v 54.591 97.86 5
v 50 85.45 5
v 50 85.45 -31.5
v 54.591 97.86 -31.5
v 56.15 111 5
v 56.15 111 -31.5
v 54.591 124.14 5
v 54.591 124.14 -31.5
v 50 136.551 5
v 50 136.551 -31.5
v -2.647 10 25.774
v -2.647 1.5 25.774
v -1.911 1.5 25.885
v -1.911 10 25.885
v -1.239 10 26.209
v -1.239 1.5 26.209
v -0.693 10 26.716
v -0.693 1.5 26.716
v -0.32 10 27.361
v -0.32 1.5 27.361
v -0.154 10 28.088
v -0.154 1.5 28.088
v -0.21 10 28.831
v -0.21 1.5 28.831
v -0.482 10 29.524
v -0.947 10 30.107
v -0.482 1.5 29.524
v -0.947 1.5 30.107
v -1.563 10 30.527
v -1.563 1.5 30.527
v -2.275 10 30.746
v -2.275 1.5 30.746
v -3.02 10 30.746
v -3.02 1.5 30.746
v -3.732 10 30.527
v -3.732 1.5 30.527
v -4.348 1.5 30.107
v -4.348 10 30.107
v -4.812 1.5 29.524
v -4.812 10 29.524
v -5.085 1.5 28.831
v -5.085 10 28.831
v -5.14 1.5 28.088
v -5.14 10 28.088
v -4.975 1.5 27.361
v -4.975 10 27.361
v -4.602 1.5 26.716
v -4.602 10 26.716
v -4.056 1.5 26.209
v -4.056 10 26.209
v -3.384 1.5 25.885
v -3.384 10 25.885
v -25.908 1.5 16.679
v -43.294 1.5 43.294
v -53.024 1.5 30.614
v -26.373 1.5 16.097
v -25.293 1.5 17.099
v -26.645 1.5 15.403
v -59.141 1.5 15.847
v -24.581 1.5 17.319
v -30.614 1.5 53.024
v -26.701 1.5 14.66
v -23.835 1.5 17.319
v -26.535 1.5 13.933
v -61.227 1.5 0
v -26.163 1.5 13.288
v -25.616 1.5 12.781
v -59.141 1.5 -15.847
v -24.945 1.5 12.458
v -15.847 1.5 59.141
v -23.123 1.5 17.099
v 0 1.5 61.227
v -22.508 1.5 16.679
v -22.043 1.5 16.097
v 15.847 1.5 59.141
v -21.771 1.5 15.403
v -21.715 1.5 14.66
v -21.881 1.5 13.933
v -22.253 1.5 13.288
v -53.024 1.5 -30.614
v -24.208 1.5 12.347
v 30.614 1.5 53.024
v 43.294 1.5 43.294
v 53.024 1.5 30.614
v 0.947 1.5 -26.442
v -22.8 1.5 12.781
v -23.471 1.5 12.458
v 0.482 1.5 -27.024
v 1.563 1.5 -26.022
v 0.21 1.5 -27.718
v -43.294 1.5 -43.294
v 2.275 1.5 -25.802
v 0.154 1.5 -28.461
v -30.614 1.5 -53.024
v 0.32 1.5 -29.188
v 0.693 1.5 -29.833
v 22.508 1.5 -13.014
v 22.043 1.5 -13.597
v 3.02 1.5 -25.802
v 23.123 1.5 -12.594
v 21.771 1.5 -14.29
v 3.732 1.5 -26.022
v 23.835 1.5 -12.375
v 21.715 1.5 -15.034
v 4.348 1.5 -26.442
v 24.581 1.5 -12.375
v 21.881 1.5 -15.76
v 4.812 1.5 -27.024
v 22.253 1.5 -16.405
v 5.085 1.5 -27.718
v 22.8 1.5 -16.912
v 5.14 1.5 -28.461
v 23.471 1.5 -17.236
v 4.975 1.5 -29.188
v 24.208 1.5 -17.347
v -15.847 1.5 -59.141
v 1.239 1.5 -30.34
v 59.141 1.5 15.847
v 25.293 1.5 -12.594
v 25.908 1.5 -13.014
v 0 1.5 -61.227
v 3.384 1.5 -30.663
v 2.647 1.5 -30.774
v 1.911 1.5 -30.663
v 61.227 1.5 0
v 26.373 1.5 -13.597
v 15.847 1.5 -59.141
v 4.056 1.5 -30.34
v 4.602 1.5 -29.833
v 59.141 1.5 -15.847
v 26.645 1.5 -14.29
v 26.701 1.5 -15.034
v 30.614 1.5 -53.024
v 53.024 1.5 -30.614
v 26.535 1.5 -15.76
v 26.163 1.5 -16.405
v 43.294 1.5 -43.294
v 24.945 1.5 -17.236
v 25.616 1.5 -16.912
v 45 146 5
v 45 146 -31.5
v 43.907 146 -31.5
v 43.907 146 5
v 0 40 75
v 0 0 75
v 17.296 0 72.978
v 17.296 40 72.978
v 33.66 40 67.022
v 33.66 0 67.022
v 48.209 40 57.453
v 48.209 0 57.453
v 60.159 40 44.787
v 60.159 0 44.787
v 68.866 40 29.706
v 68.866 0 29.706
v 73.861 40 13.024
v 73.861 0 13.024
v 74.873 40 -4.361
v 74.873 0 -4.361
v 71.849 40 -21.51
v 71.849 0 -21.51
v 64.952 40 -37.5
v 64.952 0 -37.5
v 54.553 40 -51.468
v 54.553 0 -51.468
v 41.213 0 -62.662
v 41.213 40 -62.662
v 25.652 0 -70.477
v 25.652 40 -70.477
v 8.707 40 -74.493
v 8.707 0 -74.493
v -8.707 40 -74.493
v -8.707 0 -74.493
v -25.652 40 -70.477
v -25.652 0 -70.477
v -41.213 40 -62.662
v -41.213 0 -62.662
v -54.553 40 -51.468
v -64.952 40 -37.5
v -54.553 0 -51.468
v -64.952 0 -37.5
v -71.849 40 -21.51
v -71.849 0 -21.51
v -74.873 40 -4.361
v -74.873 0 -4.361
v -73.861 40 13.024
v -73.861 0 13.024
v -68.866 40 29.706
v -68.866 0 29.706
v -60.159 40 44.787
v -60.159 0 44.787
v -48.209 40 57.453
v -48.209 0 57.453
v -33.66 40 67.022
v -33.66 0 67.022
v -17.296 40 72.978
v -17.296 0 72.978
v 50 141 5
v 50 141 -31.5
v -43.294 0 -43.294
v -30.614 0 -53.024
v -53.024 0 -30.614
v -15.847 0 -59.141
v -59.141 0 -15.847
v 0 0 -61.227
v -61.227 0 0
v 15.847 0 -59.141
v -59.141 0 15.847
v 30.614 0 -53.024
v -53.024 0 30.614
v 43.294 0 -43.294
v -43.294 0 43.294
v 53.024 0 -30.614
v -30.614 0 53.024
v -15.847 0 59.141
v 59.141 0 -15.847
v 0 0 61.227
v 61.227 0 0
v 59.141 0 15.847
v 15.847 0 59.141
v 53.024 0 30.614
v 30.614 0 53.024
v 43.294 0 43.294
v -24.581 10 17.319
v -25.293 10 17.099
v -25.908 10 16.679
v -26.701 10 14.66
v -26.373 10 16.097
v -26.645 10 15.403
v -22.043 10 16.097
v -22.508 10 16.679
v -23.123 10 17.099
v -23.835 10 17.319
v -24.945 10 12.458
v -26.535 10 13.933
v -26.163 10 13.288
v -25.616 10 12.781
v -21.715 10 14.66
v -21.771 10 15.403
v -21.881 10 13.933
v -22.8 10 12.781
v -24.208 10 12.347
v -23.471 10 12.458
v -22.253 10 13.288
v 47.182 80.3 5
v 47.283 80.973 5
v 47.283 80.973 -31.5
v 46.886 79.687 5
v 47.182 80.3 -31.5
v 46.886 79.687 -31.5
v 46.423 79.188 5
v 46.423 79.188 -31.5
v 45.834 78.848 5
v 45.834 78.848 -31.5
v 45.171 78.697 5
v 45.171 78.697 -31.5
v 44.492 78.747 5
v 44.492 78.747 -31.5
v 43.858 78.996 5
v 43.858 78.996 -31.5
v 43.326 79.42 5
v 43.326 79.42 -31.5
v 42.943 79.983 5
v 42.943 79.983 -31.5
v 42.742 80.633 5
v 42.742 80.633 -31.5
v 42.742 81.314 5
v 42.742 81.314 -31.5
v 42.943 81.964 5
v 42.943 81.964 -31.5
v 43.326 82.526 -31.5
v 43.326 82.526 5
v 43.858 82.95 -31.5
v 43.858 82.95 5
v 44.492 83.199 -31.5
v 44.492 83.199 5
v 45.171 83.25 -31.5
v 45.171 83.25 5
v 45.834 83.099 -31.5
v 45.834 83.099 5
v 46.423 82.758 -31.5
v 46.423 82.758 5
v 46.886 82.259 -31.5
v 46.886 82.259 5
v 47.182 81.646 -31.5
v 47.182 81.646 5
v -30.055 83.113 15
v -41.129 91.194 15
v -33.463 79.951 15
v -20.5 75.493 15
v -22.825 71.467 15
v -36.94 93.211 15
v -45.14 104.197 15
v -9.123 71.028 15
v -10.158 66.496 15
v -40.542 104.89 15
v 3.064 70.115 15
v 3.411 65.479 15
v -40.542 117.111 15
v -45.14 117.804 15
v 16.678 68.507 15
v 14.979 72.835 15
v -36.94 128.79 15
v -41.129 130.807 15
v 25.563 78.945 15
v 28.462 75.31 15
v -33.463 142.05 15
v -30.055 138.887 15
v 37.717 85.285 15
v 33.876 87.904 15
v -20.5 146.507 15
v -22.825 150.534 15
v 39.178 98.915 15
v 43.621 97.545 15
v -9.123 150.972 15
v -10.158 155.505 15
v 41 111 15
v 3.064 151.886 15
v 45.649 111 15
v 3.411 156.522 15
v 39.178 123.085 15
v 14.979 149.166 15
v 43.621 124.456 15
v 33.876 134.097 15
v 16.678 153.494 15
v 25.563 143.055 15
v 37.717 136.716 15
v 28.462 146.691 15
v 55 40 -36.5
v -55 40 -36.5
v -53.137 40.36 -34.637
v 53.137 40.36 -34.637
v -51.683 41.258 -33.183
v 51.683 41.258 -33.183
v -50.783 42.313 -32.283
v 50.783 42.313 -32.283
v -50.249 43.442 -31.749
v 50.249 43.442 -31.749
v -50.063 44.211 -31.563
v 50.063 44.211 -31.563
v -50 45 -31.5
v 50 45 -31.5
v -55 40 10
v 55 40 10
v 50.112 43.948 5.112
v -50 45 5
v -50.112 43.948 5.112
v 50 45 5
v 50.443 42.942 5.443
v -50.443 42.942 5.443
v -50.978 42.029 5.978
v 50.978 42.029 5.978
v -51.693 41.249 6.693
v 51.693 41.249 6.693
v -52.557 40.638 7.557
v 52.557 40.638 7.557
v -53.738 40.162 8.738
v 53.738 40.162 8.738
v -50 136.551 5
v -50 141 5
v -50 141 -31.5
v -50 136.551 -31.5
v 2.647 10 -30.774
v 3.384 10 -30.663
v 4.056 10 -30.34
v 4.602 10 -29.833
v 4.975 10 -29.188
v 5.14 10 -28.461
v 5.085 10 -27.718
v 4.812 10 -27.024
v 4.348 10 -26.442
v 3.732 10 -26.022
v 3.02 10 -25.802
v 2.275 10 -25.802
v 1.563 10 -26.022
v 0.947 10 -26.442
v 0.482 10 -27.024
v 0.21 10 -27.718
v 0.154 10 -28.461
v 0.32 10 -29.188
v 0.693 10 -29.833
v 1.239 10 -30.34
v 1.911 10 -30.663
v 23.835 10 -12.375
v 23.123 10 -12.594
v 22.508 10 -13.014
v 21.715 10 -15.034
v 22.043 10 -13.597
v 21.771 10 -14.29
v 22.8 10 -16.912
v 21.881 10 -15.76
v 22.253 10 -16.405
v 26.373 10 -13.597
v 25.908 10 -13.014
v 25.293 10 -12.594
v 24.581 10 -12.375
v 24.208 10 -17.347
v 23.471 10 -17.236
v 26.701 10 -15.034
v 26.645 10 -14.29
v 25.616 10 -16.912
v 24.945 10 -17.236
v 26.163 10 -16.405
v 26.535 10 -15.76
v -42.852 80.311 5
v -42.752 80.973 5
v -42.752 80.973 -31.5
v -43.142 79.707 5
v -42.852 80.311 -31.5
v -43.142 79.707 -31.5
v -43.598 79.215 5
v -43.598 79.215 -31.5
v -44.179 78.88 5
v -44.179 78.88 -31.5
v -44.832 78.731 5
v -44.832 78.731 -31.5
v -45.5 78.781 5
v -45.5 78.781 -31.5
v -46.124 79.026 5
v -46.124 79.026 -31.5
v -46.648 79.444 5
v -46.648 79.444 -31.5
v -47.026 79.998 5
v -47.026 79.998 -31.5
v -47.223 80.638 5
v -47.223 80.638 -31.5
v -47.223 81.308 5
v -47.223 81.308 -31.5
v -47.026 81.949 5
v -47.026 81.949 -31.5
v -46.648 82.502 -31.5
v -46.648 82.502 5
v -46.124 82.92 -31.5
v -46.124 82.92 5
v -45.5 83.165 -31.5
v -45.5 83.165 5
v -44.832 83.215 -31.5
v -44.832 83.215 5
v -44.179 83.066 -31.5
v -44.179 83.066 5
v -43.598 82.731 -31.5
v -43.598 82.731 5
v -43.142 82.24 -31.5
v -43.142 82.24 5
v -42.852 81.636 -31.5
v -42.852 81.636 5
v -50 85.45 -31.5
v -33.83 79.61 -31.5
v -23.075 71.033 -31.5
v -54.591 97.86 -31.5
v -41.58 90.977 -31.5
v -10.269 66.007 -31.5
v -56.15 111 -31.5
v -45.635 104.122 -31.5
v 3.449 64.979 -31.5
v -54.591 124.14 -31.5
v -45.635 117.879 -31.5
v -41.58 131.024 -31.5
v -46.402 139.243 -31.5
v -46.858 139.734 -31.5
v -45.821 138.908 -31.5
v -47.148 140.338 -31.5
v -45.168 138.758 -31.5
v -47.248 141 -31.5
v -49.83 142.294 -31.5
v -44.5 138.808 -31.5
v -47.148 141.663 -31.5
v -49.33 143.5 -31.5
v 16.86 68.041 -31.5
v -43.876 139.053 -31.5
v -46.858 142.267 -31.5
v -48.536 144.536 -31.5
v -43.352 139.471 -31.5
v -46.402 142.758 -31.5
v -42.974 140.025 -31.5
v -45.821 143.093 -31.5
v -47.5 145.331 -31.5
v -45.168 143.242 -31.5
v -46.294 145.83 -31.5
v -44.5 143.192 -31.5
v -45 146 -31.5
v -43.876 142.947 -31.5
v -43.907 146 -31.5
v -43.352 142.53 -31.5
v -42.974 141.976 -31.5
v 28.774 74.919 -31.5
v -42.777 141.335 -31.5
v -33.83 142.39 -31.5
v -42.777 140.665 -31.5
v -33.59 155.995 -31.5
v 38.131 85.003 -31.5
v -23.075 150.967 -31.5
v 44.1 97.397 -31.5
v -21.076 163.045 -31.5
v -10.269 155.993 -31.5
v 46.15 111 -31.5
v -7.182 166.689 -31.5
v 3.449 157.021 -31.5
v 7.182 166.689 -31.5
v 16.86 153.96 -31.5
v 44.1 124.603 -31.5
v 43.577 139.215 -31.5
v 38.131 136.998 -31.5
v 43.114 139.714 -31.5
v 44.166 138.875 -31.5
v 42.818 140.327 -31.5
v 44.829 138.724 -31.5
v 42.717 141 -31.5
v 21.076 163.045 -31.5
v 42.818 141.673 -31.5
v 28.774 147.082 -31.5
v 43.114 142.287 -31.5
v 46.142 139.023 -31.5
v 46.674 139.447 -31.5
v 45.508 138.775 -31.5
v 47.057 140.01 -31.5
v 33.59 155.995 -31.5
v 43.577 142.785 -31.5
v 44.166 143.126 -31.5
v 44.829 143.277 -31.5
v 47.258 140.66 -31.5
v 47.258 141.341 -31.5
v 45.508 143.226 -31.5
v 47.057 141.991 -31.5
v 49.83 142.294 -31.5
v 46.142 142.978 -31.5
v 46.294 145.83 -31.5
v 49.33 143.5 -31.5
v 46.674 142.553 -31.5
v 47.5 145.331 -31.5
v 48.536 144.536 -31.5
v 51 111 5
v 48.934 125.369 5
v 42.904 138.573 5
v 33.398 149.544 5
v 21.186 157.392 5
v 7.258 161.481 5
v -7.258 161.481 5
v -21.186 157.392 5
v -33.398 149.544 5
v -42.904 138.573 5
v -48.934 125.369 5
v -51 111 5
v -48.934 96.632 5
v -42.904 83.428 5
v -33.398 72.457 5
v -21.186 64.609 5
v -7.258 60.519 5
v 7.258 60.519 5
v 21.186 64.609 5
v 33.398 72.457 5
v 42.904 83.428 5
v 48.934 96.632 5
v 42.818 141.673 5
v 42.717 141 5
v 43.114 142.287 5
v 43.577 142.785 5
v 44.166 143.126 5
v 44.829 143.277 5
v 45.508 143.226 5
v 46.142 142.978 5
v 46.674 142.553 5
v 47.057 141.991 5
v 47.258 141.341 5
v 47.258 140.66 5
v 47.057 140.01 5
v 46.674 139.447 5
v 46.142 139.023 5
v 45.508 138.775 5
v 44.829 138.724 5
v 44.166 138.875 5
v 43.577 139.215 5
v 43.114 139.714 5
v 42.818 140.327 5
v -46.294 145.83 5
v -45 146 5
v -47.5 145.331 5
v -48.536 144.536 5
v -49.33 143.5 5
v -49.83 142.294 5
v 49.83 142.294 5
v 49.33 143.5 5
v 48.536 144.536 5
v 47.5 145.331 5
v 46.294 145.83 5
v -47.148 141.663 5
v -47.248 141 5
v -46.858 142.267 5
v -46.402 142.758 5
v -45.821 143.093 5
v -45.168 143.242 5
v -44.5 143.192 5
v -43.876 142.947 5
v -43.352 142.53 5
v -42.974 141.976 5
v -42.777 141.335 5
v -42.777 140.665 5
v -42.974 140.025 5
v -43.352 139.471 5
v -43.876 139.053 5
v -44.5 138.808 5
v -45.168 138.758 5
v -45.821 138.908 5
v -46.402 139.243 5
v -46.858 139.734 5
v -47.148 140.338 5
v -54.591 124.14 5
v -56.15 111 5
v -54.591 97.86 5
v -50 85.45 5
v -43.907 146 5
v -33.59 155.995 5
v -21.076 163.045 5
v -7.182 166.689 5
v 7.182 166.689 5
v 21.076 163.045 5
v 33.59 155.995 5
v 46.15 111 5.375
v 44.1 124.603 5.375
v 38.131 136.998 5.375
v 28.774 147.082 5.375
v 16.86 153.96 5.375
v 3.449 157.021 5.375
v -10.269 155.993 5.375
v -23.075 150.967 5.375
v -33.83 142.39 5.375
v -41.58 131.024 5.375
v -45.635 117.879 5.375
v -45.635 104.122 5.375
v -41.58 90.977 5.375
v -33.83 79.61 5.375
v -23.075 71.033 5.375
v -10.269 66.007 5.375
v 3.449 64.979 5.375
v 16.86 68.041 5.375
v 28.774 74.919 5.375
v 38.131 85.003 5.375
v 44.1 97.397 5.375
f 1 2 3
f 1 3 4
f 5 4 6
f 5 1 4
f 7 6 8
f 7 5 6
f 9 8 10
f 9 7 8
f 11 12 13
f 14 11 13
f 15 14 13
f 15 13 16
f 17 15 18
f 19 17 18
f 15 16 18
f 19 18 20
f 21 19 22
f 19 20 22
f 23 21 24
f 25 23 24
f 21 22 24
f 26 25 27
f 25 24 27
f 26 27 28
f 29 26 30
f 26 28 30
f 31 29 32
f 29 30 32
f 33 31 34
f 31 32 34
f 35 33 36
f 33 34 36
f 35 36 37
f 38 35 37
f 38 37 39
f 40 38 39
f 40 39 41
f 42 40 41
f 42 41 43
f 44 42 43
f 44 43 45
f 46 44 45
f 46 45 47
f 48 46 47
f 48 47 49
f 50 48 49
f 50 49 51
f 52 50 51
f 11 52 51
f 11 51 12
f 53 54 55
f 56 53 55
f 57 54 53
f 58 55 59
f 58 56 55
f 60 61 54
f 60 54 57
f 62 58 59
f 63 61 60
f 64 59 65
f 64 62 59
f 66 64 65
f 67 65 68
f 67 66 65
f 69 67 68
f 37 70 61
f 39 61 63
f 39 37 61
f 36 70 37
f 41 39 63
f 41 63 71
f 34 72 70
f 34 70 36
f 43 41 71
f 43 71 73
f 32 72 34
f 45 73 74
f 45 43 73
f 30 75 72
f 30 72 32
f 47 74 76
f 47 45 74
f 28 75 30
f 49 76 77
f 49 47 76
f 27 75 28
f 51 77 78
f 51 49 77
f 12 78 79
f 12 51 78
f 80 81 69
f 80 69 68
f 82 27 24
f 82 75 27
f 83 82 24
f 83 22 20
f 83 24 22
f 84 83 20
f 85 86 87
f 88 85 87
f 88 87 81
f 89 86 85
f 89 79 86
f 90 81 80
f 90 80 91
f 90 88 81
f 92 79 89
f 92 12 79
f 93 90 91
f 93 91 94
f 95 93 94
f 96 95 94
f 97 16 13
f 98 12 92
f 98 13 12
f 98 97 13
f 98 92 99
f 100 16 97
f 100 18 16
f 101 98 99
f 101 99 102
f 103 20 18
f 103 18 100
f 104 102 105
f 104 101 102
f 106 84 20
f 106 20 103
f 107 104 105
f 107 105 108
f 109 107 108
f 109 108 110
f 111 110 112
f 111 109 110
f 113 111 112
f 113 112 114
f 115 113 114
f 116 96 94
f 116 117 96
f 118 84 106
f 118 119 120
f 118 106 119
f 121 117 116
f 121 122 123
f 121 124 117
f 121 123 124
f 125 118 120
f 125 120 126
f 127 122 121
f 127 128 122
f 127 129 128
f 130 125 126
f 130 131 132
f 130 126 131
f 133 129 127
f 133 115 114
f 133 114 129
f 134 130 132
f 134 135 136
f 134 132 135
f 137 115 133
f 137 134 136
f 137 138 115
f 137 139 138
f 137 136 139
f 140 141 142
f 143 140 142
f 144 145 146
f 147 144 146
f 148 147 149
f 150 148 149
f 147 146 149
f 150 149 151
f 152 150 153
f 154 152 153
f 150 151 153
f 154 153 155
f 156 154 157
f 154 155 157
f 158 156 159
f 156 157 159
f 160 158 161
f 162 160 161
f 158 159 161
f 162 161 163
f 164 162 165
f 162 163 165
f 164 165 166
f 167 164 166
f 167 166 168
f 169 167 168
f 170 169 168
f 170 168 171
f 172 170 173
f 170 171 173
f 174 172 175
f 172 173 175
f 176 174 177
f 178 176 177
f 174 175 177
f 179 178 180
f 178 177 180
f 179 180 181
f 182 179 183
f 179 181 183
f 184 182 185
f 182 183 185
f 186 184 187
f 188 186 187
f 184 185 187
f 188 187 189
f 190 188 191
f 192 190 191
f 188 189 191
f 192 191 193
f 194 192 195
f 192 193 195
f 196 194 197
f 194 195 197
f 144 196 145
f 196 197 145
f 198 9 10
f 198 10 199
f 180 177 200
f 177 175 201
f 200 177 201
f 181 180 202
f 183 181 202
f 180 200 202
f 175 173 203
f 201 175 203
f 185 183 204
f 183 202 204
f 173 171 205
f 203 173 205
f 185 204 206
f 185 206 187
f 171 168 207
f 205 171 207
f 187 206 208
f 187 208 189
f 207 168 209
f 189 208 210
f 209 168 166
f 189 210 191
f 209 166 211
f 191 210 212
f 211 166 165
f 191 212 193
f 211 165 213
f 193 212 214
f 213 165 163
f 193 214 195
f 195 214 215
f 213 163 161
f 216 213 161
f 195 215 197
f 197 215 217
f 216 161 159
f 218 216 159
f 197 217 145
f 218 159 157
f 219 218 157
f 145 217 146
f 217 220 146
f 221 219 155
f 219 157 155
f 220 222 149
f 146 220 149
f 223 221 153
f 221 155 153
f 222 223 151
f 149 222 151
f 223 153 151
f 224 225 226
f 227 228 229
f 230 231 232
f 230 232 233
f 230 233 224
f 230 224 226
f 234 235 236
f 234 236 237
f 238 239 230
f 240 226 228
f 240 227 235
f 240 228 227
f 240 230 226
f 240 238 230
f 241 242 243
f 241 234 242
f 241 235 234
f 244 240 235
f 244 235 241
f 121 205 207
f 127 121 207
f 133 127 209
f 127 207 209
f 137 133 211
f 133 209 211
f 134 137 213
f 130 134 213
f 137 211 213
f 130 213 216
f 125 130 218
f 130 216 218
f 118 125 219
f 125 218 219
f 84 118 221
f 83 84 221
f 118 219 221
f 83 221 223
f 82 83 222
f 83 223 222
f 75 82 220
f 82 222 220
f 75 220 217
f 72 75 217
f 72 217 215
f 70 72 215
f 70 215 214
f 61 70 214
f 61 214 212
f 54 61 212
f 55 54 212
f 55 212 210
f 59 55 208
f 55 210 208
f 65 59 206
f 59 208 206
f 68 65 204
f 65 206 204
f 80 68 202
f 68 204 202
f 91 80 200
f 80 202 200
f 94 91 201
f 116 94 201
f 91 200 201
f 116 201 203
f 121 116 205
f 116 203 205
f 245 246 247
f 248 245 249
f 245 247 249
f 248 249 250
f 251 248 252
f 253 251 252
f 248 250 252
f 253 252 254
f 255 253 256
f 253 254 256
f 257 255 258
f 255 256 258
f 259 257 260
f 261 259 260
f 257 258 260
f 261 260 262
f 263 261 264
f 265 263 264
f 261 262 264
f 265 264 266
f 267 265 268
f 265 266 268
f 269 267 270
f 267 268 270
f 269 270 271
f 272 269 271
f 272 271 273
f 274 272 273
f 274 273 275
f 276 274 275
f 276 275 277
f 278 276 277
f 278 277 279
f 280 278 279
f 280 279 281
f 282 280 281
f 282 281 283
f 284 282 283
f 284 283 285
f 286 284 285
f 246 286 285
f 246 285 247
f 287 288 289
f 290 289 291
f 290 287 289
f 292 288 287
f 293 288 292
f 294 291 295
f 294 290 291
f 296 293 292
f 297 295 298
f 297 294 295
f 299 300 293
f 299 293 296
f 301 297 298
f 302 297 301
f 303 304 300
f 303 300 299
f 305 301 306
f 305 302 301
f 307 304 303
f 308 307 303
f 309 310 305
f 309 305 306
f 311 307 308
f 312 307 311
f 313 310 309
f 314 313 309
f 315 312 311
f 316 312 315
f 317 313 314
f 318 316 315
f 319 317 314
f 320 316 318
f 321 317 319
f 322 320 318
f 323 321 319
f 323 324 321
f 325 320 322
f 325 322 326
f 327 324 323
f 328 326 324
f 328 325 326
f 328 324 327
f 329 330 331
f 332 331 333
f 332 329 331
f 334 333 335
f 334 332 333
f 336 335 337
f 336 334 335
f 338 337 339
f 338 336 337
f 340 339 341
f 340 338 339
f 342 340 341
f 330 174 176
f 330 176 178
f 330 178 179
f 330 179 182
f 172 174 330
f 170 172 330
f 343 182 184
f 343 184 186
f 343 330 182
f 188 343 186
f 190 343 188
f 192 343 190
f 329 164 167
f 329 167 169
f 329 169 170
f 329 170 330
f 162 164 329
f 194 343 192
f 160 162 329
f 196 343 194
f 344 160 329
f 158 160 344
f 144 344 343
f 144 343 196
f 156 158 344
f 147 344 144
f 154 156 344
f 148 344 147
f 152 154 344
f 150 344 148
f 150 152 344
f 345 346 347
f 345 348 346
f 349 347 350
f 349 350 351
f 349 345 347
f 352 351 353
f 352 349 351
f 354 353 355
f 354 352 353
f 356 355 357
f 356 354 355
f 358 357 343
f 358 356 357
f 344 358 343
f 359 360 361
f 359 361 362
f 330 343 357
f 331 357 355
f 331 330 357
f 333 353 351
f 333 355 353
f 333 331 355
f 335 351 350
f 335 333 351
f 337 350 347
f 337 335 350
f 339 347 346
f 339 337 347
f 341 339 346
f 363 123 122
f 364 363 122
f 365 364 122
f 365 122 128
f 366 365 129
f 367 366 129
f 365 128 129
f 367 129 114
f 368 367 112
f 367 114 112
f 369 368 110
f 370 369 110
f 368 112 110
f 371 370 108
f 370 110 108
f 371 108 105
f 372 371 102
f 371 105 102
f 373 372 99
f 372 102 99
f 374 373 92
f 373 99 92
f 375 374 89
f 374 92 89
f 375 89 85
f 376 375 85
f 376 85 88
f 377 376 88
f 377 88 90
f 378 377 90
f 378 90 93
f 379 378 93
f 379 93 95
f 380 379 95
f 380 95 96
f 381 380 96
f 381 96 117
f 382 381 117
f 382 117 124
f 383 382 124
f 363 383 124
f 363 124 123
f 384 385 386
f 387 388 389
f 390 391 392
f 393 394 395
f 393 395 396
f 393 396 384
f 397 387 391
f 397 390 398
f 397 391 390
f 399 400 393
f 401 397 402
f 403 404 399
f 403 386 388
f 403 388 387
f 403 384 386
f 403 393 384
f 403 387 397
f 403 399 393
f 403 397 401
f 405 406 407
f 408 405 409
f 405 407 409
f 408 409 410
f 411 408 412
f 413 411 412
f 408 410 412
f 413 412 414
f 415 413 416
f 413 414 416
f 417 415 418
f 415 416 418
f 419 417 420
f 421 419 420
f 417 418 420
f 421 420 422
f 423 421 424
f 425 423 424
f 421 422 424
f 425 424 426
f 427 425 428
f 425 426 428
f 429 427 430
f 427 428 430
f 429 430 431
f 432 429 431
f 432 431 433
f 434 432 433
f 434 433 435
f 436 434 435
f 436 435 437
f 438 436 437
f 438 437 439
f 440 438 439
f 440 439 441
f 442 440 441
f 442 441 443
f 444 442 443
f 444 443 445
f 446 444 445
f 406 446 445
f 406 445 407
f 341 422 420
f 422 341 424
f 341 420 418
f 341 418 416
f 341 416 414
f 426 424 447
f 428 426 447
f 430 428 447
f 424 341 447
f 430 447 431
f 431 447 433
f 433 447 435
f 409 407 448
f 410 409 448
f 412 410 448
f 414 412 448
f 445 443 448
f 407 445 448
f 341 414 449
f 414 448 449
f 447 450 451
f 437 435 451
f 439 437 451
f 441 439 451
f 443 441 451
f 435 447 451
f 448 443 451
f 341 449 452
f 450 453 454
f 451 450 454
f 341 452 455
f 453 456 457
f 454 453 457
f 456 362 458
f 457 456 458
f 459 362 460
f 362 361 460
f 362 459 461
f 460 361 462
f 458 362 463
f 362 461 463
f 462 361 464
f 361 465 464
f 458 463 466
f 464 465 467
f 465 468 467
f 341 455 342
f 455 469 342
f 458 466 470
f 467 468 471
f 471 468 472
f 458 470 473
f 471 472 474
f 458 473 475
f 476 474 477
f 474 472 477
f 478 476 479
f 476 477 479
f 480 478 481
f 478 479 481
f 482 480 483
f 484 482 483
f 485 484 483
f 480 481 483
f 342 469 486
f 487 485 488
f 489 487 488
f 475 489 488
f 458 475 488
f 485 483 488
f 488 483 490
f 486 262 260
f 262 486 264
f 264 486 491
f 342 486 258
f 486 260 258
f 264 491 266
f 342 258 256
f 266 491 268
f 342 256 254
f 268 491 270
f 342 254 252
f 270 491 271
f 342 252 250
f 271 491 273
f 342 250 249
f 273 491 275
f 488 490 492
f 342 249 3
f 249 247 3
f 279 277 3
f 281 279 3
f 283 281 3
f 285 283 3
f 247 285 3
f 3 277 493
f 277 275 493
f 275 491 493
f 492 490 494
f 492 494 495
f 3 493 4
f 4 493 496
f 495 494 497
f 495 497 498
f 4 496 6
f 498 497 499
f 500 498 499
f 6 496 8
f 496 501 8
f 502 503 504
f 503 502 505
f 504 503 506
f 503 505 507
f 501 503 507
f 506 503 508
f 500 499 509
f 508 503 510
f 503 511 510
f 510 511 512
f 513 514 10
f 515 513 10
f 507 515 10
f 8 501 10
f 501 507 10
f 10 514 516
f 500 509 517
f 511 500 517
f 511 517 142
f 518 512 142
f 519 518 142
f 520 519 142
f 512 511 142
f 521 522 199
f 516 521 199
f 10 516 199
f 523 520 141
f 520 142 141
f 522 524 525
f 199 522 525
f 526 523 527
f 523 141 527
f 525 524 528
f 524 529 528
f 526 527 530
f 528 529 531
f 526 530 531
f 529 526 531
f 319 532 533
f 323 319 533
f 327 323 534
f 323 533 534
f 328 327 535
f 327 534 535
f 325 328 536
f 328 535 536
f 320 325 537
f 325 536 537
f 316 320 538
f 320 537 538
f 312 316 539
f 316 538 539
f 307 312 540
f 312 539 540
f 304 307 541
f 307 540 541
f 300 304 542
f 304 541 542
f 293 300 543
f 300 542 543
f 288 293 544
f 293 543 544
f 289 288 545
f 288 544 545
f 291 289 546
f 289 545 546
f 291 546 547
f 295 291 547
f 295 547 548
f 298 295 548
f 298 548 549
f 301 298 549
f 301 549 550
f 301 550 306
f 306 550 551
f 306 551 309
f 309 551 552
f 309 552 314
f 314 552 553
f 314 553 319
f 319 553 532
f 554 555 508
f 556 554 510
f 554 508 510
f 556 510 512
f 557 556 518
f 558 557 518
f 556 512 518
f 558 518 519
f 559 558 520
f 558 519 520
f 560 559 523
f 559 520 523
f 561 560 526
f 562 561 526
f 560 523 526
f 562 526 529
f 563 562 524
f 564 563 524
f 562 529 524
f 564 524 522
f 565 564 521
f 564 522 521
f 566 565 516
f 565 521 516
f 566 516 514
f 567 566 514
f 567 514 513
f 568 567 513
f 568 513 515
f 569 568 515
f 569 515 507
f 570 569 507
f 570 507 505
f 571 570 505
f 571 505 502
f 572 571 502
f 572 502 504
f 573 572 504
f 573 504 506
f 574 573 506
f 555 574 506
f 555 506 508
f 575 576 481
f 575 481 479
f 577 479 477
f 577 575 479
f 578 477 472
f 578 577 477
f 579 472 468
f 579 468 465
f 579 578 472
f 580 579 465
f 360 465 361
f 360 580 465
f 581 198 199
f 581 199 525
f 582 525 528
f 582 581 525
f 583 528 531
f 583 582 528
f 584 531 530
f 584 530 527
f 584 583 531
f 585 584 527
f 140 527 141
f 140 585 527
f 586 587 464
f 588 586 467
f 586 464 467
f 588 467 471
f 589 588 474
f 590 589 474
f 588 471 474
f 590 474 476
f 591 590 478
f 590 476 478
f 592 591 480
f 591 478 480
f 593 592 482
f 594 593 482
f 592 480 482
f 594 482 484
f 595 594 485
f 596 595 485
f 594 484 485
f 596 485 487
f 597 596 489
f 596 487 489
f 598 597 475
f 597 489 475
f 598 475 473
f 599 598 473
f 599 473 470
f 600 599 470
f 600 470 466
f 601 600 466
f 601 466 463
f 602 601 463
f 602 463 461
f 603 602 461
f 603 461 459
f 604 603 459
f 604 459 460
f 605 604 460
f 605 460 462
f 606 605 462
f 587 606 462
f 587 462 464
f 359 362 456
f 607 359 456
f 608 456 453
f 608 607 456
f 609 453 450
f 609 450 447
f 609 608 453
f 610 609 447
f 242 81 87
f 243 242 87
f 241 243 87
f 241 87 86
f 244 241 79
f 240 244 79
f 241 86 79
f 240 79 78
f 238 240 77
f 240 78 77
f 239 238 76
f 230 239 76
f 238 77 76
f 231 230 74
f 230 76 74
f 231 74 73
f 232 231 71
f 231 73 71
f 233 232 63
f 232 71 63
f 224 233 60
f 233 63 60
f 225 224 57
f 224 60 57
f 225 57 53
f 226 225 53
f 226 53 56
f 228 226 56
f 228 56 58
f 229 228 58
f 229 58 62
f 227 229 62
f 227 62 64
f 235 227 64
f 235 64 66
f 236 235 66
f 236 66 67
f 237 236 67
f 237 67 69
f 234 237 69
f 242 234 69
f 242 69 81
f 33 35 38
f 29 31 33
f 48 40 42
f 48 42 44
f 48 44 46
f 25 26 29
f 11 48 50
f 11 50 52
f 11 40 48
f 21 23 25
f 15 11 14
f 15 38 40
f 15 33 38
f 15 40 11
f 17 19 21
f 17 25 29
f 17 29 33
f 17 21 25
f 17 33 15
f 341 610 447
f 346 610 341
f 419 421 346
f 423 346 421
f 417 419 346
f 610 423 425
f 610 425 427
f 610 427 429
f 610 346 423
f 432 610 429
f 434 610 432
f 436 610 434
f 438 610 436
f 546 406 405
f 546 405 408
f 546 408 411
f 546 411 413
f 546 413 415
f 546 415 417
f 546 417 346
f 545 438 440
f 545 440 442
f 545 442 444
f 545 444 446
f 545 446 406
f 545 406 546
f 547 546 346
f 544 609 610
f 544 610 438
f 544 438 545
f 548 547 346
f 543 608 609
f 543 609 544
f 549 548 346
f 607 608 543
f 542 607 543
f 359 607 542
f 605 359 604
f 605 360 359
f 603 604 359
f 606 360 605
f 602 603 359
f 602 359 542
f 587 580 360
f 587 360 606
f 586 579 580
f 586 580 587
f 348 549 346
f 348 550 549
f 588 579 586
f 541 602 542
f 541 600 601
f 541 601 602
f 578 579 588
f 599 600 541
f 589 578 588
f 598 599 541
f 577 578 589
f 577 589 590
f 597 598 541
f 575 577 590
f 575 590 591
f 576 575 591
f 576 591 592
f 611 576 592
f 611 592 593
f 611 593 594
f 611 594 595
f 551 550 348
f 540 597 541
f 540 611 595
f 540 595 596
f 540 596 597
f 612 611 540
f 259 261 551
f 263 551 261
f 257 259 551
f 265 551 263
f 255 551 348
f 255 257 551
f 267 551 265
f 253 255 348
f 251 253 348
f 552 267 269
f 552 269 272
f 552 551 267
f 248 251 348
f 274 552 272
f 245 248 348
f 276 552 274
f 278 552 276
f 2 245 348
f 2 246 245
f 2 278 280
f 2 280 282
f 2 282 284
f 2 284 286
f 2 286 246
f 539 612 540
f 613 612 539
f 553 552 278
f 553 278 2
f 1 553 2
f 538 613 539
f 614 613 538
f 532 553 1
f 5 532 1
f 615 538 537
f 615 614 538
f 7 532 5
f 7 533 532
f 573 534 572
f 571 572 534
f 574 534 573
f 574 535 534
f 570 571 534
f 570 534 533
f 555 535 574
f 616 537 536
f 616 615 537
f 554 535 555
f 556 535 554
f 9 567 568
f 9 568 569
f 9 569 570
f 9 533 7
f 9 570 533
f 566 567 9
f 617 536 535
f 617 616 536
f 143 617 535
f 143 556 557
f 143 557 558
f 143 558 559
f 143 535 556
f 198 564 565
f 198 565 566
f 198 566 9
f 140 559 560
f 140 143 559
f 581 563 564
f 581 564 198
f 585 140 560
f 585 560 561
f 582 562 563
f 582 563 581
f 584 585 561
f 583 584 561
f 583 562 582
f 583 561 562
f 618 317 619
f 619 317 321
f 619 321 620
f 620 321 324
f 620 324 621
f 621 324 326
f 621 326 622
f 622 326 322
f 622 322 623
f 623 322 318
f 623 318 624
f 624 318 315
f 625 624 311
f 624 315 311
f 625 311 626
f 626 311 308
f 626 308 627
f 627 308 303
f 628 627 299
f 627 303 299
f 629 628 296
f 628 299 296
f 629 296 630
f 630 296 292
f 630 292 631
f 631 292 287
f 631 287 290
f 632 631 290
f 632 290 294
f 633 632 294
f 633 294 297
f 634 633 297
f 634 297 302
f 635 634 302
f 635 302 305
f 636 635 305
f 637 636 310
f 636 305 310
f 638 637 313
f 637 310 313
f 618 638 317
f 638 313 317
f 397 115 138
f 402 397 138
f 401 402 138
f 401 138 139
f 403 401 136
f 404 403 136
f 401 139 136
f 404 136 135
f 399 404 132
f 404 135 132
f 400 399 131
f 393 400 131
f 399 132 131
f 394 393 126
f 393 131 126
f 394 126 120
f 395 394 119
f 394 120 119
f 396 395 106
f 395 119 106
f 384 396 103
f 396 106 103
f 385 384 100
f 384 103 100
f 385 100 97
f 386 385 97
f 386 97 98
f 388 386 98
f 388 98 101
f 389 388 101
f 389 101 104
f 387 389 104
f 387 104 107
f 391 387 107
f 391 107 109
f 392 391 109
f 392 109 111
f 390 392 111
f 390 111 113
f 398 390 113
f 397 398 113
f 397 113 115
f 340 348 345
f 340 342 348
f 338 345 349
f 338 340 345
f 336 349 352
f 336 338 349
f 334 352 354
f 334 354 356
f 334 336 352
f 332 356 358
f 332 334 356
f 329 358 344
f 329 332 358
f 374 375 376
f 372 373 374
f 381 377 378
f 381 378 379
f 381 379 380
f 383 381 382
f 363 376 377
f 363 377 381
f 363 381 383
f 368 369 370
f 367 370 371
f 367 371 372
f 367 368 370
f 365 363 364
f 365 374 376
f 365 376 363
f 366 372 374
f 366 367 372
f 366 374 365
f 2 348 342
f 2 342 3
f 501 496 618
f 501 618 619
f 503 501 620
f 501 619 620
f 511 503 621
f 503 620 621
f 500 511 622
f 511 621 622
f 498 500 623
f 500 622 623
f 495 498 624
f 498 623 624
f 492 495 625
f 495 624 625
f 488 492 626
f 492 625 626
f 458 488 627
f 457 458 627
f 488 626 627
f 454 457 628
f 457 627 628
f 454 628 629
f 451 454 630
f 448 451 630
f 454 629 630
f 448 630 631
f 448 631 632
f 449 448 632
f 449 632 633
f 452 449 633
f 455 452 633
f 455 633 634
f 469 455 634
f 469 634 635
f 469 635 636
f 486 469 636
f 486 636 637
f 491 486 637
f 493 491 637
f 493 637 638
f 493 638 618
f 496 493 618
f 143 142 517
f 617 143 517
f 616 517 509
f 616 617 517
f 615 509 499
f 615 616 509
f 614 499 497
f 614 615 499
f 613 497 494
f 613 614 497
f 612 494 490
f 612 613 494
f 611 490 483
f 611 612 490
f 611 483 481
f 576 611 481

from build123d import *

# Parameters (mm, degrees)
CROQUIS1_R              = 75
SALIENTE_EXTRUIR1_DEPTH = 40
SALIENTE_EXTRUIR2_START = 5
CROQUIS3_R              = 46.15
SALIENTE_EXTRUIR2_DEPTH = 36.5
CROQUIS5_R              = 51
CROQUIS5_R_2            = 41
SALIENTE_EXTRUIR3_DEPTH = 10
CHAFL_N1_SIZE           = 5.350722602
CHAFL_N1_SIZE_2         = 10
CHAFL_N2_SIZE2          = 10
CHAFL_N2_SIZE           = 5.350722602
REDONDEO1_R             = 5
CROQUIS7_R              = 2.248271999
CROQUIS7_R_2            = 2.28310755
CORTAR_EXTRUIR2_DEPTH   = 212.91154603
CROQUIS8_R              = 61.227064255
CORTAR_EXTRUIR3_DEPTH   = 1.5
CROQUIS8_3_R            = 2.5
CORTAR_EXTRUIR4_DEPTH   = 10


# Some blends are built 0.0001 mm under size
with BuildPart() as part:
    # Croquis1 → Saliente-Extruir1 (new body)
    with BuildSketch(Plane(origin=(0, 0, 0), x_dir=(1, 0, 0), z_dir=(0, 1, 0))):
        with Locations(Location((0, 0, 0), (0, 0, 270))):
            Circle(CROQUIS1_R)
    extrude(amount=SALIENTE_EXTRUIR1_DEPTH)

    # Croquis3 → Saliente-Extruir2 (add)
    with BuildSketch(Plane.XY.offset(SALIENTE_EXTRUIR2_START)):
        with BuildLine():
            Line((45, 146.000391386), (43.906975528, 146.000391386))
            ThreePointArc((43.906975528, 146.000391386), (0, 167.150391386), (-43.906975528, 146.000391386))
            Line((-43.906975528, 146.000391386), (-45, 146.000391386))
            ThreePointArc((-45, 146.000391386), (-48.535533906, 144.535925292), (-50, 141.000391386))
            Line((-50, 141.000391386), (-50, 136.550782773))
            ThreePointArc((-50, 136.550782773), (-56.15, 111.000391386), (-50, 85.45))
            Line((-50, 85.45), (-50, 40))
            Line((-50, 40), (50, 40))
            Line((50, 40), (50, 85.45))
            ThreePointArc((50, 85.45), (56.15, 111.000391386), (50, 136.550782773))
            Line((50, 136.550782773), (50, 141.000391386))
            ThreePointArc((50, 141.000391386), (48.535533906, 144.535925292), (45, 146.000391386))
        make_face()
        with Locations((0, 111.000391386)):
            Circle(CROQUIS3_R, mode=Mode.SUBTRACT)
    extrude(amount=-SALIENTE_EXTRUIR2_DEPTH)

    # Croquis5 → Saliente-Extruir3 (add)
    with BuildSketch(Plane.XY.offset(5)):
        with Locations((0, 111.000391386)):
            Circle(CROQUIS5_R)
        with Locations((0, 111.000391386)):
            Circle(CROQUIS5_R_2, mode=Mode.SUBTRACT)
    extrude(amount=SALIENTE_EXTRUIR3_DEPTH)

    # Chaflán1
    # the kernel refuses this chamfer: 10, 5.350722602 mm, written as the material it takes off along each edge
    with BuildSketch(Plane(origin=(0, 111.000391386, 5), x_dir=(1, 0, 0), z_dir=(0, -1, 0))) as chafl_n1_piece_1_section:
        Polygon((41 + CHAFL_N1_SIZE, 0), (41, CHAFL_N1_SIZE_2), (41, 0), align=None)
    chafl_n1_piece_1 = revolve(axis=Axis((0, 111.000391386, 5), (0, 0, 1)), mode=Mode.PRIVATE)
    chafl_n1_piece_1 = chafl_n1_piece_1 & Plane(origin=(0, 111.000391386, 10.096546519), x_dir=(1, 0, 0), z_dir=(0, 0, 1)) * Cylinder(46.15, 186, mode=Mode.PRIVATE)
    add(chafl_n1_piece_1, mode=Mode.SUBTRACT)

    # Chaflán2
    chafl_n2_edges = [part.edges().sort_by_distance(p)[0] for p in [
        (-51, 111.000391386, 15),
    ]]
    chafl_n2_side = [part.faces().sort_by_distance(p)[0] for p in [
        (-50.892985548, 111.000391386, 15),
    ]]
    chamfer(chafl_n2_edges, length=CHAFL_N2_SIZE - 0.0001, length2=CHAFL_N2_SIZE2 - 0.0001, reference=chafl_n2_side[0])  # a hair under: the kernel refuses the full size

    # Redondeo1
    redondeo1_edges = [part.edges().sort_by_distance(p)[0] for p in [
        (0, 40, 5),
        (0, 40, -31.5),
        (50, 40, -13.25),
        (-50, 40, -13.25),
    ]]
    fillet(redondeo1_edges, radius=REDONDEO1_R)

    # Croquis7 → Cortar-Extruir2 (cut, through all)
    with BuildSketch(Plane(origin=(0, 0, -31.5), x_dir=(-1, 0, 0), z_dir=(0, 0, -1))):
        with Locations((45, 141.000391386)):
            Circle(CROQUIS7_R)
        with Locations((-45.000000475, 141.000390201)):
            Circle(CROQUIS7_R_2)
        with Locations(Location((-45.000000475, 80.973259529, 0), (0, 0, 180))):
            Circle(CROQUIS7_R_2)
        with Locations(Location((45, 80.973258343, 0), (0, 0, 180))):
            Circle(CROQUIS7_R)
    extrude(amount=-CORTAR_EXTRUIR2_DEPTH, mode=Mode.SUBTRACT)

    # Croquis8 → Cortar-Extruir3 (cut)
    with BuildSketch(Plane.XZ):
        with Locations(Location((0, 0, 0), (0, 0, 270))):
            Circle(CROQUIS8_R)
    extrude(amount=-CORTAR_EXTRUIR3_DEPTH, mode=Mode.SUBTRACT)

    # Croquis8<3> → Cortar-Extruir4 (cut)
    with BuildSketch(Plane.XZ):
        with Locations(Location((-2.647399238, 28.274392606, 0), (0, 0, 270))):
            Circle(CROQUIS8_3_R)
        with Locations(Location((24.207953628, -14.846716173, 0), (0, 0, 270))):
            Circle(CROQUIS8_3_R)
        with Locations(Location((2.647399238, -28.274392607, 0), (0, 0, 270))):
            Circle(CROQUIS8_3_R)
        with Locations(Location((-24.207953628, 14.846716173, 0), (0, 0, 270))):
            Circle(CROQUIS8_3_R)
    extrude(amount=-CORTAR_EXTRUIR4_DEPTH, mode=Mode.SUBTRACT)


solid = part.part
